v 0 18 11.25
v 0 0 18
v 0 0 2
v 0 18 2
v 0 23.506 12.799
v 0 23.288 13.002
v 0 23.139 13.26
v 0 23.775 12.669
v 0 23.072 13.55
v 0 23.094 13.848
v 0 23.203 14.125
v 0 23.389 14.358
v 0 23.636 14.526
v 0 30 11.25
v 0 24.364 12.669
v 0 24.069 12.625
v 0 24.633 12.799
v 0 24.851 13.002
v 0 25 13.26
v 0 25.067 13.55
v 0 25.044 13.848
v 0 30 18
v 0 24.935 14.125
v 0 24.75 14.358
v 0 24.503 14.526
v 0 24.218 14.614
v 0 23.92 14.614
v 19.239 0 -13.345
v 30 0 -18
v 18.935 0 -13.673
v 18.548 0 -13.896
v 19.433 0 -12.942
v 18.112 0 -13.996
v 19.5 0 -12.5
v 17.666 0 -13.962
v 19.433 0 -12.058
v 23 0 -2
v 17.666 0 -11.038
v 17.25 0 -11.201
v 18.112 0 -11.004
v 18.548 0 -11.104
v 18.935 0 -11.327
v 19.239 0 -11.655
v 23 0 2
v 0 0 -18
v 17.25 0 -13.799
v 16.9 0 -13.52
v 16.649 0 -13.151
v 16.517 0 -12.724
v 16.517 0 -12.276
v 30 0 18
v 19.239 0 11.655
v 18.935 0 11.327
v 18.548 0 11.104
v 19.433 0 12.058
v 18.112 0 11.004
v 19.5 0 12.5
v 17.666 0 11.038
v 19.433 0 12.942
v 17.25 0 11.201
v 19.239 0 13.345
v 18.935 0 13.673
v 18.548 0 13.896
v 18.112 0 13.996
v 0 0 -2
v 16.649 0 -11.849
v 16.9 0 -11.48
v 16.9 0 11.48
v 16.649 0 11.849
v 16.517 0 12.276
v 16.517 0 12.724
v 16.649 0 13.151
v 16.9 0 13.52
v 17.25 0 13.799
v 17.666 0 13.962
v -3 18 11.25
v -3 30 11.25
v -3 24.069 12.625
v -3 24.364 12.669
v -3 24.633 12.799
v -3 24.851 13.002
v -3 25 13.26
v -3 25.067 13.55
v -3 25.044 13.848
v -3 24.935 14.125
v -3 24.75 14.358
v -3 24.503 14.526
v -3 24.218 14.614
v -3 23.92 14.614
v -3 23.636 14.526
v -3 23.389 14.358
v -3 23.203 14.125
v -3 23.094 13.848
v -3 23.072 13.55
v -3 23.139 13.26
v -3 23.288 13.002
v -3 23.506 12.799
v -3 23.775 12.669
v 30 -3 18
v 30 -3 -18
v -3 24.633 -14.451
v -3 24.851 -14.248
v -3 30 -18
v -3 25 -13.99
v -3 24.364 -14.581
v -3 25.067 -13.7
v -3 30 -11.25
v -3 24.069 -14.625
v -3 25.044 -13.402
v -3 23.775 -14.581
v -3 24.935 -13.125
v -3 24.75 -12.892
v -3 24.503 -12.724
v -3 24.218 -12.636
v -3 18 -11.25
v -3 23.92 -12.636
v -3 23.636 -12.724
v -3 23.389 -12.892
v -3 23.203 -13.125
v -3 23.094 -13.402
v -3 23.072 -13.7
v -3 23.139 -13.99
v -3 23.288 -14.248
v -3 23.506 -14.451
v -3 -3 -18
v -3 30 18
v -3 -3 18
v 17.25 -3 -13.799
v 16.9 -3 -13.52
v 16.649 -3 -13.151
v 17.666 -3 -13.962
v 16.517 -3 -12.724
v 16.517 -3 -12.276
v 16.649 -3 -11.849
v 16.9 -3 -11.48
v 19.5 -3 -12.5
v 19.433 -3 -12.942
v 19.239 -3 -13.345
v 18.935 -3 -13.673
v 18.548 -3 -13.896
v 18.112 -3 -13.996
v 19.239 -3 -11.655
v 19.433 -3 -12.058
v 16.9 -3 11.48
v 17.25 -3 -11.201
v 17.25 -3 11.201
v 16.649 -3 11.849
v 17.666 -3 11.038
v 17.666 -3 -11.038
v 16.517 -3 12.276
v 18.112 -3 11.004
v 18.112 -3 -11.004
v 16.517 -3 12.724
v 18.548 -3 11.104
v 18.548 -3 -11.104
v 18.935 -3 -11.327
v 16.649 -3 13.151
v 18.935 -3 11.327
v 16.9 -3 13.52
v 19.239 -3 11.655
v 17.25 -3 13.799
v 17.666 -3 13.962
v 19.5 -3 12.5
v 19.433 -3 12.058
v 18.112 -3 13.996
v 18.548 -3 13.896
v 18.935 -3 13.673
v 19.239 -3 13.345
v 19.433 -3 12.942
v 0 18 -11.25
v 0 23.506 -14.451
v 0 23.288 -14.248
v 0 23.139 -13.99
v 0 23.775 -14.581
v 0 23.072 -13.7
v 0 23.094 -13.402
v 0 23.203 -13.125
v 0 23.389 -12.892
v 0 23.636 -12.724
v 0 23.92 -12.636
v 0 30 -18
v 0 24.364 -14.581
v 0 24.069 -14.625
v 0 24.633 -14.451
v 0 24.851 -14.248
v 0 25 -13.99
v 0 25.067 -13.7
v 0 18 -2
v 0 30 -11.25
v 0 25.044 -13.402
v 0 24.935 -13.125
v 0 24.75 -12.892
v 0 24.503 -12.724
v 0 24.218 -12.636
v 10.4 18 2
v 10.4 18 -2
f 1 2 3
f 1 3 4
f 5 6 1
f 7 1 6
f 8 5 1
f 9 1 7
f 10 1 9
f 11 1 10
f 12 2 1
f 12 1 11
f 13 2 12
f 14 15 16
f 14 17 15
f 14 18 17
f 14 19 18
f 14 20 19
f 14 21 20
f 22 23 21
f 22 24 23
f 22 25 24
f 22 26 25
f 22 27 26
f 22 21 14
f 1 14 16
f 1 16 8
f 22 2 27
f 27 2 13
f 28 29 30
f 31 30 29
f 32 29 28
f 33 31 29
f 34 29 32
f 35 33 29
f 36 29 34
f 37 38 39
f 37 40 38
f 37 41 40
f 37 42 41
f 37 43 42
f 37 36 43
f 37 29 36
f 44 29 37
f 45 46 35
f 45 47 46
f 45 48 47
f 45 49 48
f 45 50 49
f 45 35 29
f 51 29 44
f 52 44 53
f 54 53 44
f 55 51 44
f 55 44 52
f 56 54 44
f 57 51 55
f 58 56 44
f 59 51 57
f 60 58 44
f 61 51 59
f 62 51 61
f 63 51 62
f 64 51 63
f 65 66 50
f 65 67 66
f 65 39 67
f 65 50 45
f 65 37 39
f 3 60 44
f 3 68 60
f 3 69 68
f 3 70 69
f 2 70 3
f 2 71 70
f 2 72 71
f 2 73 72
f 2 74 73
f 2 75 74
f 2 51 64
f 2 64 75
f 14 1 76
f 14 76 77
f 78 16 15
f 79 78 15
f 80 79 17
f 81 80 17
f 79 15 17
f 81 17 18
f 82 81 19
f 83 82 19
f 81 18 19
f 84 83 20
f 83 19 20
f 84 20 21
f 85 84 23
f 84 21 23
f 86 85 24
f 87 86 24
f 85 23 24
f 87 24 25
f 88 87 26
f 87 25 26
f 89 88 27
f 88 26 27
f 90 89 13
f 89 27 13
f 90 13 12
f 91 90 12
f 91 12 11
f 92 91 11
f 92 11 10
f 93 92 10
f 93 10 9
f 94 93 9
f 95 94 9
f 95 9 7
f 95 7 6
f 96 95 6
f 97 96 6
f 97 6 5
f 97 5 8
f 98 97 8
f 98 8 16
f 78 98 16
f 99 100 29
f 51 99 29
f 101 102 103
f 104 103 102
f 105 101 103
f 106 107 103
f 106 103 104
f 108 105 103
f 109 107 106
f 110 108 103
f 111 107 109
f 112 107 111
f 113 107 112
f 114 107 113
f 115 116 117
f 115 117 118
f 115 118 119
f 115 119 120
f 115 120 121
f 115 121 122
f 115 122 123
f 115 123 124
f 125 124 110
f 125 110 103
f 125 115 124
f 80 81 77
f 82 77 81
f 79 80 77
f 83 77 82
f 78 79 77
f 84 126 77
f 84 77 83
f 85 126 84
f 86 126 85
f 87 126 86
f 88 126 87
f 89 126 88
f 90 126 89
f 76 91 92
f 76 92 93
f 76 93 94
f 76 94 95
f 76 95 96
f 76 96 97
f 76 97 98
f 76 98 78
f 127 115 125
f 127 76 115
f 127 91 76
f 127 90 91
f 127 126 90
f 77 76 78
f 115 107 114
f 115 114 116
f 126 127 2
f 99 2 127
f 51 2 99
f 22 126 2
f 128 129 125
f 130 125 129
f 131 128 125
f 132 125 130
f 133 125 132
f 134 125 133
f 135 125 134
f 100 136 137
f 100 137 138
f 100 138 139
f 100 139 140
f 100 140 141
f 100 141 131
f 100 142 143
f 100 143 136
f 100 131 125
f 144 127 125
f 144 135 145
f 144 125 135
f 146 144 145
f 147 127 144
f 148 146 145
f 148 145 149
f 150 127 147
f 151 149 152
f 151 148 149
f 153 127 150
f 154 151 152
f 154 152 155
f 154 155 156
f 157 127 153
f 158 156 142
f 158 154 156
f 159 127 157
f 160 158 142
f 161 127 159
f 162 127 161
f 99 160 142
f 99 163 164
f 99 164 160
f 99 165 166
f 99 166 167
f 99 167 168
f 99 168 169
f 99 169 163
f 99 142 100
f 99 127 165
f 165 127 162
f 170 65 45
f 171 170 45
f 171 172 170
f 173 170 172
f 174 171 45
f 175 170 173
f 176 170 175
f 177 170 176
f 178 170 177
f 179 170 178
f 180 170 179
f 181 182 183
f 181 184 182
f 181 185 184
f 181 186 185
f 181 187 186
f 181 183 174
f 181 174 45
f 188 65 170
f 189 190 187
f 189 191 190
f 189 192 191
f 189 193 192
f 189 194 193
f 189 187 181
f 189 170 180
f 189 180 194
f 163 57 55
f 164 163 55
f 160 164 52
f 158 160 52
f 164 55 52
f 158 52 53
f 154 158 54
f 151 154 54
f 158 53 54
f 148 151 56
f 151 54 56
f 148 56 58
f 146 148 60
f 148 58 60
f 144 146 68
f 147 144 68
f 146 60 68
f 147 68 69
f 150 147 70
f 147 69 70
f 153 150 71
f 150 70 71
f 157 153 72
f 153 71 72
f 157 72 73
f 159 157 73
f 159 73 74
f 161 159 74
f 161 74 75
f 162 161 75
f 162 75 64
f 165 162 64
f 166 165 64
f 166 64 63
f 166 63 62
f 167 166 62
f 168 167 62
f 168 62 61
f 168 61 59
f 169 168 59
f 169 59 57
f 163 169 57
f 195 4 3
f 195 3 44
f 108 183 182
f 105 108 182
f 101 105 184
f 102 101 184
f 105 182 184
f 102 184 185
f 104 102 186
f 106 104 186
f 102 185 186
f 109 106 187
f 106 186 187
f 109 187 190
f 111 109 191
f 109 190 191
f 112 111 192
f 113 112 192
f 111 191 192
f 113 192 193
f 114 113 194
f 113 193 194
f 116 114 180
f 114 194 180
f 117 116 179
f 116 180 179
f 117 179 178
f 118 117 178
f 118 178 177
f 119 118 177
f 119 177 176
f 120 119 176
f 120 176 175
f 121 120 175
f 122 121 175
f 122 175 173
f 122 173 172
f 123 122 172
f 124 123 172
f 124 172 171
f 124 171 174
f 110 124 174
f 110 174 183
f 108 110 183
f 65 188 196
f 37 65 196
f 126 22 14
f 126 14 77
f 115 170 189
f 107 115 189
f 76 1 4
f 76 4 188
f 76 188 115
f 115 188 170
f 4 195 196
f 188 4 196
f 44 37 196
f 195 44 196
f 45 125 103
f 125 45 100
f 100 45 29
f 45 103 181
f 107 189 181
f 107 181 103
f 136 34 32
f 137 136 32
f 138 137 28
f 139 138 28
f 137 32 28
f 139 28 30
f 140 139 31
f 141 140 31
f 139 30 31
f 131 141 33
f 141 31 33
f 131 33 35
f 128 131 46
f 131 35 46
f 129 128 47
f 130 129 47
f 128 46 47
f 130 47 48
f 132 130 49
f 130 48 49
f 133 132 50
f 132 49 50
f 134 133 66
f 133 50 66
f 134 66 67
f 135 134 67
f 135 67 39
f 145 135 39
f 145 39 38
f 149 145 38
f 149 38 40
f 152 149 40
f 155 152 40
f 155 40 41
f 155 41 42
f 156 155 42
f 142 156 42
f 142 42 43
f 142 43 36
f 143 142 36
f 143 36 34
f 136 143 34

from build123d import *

# Parameters (mm, degrees)
EXTRUDE_THIN1_DEPTH = 18
SKETCH2_W           = 22.5
SKETCH2_H           = 12
CUT_EXTRUDE1_DEPTH  = 4
SKETCH3_R           = 1
CUT_EXTRUDE2_DEPTH  = 4
SKETCH6_W           = 23
SKETCH6_H           = 4
BOSS_EXTRUDE1_DEPTH = 18
CUT_EXTRUDE3_DEPTH  = 21
SKETCH8_R           = 1.5
CUT_EXTRUDE4_DEPTH  = 4


with BuildPart() as part:
    # Sketch1 → Extrude-Thin1 (new body, symmetric)
    with BuildSketch(Plane.XY):
        Polygon((30, 0), (0, 0), (0, 30), (-3, 30), (-3, -3), (30, -3), align=None)
    extrude(amount=EXTRUDE_THIN1_DEPTH, both=True)

    # Sketch2 → Cut-Extrude1 (cut, through all)
    with BuildSketch(Plane(origin=(0, 0, 0), x_dir=(0, 0, -1), z_dir=(1, 0, 0))):
        with Locations((0, 24)):
            Rectangle(SKETCH2_W, SKETCH2_H)
    extrude(amount=-CUT_EXTRUDE1_DEPTH, mode=Mode.SUBTRACT)

    # Sketch3 → Cut-Extrude2 (cut, through all)
    with BuildSketch(Plane(origin=(0, 0, 0), x_dir=(0, 0, -1), z_dir=(1, 0, 0))):
        with Locations((13.625, 24.069423531)):
            Circle(SKETCH3_R)
        with Locations((-13.625, 24.069423531)):
            Circle(SKETCH3_R)
    extrude(amount=-CUT_EXTRUDE2_DEPTH, mode=Mode.SUBTRACT)

    # Sketch6 → Boss-Extrude1 (add)
    with BuildSketch(Plane(origin=(0, 0, 0), x_dir=(1, 0, 0), z_dir=(0, 1, 0))):
        with Locations((11.5, 0)):
            Rectangle(SKETCH6_W, SKETCH6_H)
    extrude(amount=BOSS_EXTRUDE1_DEPTH)

    # Sketch7 → Cut-Extrude3 (cut, through all)
    with BuildSketch(Plane(origin=(0, 0, -2), x_dir=(-1, 0, 0), z_dir=(0, 0, -1))):
        Polygon((-10.399594351, 18), (-23, 18), (-23, 0), align=None)
    extrude(amount=-CUT_EXTRUDE3_DEPTH, mode=Mode.SUBTRACT)

    # Sketch8 → Cut-Extrude4 (cut, through all)
    with BuildSketch(Plane(origin=(0, 0, 0), x_dir=(1, 0, 0), z_dir=(0, 1, 0))):
        with Locations((18, 12.5)):
            Circle(SKETCH8_R)
        with Locations((18, -12.5)):
            Circle(SKETCH8_R)
    extrude(amount=-CUT_EXTRUDE4_DEPTH, mode=Mode.SUBTRACT)


solid = part.part
